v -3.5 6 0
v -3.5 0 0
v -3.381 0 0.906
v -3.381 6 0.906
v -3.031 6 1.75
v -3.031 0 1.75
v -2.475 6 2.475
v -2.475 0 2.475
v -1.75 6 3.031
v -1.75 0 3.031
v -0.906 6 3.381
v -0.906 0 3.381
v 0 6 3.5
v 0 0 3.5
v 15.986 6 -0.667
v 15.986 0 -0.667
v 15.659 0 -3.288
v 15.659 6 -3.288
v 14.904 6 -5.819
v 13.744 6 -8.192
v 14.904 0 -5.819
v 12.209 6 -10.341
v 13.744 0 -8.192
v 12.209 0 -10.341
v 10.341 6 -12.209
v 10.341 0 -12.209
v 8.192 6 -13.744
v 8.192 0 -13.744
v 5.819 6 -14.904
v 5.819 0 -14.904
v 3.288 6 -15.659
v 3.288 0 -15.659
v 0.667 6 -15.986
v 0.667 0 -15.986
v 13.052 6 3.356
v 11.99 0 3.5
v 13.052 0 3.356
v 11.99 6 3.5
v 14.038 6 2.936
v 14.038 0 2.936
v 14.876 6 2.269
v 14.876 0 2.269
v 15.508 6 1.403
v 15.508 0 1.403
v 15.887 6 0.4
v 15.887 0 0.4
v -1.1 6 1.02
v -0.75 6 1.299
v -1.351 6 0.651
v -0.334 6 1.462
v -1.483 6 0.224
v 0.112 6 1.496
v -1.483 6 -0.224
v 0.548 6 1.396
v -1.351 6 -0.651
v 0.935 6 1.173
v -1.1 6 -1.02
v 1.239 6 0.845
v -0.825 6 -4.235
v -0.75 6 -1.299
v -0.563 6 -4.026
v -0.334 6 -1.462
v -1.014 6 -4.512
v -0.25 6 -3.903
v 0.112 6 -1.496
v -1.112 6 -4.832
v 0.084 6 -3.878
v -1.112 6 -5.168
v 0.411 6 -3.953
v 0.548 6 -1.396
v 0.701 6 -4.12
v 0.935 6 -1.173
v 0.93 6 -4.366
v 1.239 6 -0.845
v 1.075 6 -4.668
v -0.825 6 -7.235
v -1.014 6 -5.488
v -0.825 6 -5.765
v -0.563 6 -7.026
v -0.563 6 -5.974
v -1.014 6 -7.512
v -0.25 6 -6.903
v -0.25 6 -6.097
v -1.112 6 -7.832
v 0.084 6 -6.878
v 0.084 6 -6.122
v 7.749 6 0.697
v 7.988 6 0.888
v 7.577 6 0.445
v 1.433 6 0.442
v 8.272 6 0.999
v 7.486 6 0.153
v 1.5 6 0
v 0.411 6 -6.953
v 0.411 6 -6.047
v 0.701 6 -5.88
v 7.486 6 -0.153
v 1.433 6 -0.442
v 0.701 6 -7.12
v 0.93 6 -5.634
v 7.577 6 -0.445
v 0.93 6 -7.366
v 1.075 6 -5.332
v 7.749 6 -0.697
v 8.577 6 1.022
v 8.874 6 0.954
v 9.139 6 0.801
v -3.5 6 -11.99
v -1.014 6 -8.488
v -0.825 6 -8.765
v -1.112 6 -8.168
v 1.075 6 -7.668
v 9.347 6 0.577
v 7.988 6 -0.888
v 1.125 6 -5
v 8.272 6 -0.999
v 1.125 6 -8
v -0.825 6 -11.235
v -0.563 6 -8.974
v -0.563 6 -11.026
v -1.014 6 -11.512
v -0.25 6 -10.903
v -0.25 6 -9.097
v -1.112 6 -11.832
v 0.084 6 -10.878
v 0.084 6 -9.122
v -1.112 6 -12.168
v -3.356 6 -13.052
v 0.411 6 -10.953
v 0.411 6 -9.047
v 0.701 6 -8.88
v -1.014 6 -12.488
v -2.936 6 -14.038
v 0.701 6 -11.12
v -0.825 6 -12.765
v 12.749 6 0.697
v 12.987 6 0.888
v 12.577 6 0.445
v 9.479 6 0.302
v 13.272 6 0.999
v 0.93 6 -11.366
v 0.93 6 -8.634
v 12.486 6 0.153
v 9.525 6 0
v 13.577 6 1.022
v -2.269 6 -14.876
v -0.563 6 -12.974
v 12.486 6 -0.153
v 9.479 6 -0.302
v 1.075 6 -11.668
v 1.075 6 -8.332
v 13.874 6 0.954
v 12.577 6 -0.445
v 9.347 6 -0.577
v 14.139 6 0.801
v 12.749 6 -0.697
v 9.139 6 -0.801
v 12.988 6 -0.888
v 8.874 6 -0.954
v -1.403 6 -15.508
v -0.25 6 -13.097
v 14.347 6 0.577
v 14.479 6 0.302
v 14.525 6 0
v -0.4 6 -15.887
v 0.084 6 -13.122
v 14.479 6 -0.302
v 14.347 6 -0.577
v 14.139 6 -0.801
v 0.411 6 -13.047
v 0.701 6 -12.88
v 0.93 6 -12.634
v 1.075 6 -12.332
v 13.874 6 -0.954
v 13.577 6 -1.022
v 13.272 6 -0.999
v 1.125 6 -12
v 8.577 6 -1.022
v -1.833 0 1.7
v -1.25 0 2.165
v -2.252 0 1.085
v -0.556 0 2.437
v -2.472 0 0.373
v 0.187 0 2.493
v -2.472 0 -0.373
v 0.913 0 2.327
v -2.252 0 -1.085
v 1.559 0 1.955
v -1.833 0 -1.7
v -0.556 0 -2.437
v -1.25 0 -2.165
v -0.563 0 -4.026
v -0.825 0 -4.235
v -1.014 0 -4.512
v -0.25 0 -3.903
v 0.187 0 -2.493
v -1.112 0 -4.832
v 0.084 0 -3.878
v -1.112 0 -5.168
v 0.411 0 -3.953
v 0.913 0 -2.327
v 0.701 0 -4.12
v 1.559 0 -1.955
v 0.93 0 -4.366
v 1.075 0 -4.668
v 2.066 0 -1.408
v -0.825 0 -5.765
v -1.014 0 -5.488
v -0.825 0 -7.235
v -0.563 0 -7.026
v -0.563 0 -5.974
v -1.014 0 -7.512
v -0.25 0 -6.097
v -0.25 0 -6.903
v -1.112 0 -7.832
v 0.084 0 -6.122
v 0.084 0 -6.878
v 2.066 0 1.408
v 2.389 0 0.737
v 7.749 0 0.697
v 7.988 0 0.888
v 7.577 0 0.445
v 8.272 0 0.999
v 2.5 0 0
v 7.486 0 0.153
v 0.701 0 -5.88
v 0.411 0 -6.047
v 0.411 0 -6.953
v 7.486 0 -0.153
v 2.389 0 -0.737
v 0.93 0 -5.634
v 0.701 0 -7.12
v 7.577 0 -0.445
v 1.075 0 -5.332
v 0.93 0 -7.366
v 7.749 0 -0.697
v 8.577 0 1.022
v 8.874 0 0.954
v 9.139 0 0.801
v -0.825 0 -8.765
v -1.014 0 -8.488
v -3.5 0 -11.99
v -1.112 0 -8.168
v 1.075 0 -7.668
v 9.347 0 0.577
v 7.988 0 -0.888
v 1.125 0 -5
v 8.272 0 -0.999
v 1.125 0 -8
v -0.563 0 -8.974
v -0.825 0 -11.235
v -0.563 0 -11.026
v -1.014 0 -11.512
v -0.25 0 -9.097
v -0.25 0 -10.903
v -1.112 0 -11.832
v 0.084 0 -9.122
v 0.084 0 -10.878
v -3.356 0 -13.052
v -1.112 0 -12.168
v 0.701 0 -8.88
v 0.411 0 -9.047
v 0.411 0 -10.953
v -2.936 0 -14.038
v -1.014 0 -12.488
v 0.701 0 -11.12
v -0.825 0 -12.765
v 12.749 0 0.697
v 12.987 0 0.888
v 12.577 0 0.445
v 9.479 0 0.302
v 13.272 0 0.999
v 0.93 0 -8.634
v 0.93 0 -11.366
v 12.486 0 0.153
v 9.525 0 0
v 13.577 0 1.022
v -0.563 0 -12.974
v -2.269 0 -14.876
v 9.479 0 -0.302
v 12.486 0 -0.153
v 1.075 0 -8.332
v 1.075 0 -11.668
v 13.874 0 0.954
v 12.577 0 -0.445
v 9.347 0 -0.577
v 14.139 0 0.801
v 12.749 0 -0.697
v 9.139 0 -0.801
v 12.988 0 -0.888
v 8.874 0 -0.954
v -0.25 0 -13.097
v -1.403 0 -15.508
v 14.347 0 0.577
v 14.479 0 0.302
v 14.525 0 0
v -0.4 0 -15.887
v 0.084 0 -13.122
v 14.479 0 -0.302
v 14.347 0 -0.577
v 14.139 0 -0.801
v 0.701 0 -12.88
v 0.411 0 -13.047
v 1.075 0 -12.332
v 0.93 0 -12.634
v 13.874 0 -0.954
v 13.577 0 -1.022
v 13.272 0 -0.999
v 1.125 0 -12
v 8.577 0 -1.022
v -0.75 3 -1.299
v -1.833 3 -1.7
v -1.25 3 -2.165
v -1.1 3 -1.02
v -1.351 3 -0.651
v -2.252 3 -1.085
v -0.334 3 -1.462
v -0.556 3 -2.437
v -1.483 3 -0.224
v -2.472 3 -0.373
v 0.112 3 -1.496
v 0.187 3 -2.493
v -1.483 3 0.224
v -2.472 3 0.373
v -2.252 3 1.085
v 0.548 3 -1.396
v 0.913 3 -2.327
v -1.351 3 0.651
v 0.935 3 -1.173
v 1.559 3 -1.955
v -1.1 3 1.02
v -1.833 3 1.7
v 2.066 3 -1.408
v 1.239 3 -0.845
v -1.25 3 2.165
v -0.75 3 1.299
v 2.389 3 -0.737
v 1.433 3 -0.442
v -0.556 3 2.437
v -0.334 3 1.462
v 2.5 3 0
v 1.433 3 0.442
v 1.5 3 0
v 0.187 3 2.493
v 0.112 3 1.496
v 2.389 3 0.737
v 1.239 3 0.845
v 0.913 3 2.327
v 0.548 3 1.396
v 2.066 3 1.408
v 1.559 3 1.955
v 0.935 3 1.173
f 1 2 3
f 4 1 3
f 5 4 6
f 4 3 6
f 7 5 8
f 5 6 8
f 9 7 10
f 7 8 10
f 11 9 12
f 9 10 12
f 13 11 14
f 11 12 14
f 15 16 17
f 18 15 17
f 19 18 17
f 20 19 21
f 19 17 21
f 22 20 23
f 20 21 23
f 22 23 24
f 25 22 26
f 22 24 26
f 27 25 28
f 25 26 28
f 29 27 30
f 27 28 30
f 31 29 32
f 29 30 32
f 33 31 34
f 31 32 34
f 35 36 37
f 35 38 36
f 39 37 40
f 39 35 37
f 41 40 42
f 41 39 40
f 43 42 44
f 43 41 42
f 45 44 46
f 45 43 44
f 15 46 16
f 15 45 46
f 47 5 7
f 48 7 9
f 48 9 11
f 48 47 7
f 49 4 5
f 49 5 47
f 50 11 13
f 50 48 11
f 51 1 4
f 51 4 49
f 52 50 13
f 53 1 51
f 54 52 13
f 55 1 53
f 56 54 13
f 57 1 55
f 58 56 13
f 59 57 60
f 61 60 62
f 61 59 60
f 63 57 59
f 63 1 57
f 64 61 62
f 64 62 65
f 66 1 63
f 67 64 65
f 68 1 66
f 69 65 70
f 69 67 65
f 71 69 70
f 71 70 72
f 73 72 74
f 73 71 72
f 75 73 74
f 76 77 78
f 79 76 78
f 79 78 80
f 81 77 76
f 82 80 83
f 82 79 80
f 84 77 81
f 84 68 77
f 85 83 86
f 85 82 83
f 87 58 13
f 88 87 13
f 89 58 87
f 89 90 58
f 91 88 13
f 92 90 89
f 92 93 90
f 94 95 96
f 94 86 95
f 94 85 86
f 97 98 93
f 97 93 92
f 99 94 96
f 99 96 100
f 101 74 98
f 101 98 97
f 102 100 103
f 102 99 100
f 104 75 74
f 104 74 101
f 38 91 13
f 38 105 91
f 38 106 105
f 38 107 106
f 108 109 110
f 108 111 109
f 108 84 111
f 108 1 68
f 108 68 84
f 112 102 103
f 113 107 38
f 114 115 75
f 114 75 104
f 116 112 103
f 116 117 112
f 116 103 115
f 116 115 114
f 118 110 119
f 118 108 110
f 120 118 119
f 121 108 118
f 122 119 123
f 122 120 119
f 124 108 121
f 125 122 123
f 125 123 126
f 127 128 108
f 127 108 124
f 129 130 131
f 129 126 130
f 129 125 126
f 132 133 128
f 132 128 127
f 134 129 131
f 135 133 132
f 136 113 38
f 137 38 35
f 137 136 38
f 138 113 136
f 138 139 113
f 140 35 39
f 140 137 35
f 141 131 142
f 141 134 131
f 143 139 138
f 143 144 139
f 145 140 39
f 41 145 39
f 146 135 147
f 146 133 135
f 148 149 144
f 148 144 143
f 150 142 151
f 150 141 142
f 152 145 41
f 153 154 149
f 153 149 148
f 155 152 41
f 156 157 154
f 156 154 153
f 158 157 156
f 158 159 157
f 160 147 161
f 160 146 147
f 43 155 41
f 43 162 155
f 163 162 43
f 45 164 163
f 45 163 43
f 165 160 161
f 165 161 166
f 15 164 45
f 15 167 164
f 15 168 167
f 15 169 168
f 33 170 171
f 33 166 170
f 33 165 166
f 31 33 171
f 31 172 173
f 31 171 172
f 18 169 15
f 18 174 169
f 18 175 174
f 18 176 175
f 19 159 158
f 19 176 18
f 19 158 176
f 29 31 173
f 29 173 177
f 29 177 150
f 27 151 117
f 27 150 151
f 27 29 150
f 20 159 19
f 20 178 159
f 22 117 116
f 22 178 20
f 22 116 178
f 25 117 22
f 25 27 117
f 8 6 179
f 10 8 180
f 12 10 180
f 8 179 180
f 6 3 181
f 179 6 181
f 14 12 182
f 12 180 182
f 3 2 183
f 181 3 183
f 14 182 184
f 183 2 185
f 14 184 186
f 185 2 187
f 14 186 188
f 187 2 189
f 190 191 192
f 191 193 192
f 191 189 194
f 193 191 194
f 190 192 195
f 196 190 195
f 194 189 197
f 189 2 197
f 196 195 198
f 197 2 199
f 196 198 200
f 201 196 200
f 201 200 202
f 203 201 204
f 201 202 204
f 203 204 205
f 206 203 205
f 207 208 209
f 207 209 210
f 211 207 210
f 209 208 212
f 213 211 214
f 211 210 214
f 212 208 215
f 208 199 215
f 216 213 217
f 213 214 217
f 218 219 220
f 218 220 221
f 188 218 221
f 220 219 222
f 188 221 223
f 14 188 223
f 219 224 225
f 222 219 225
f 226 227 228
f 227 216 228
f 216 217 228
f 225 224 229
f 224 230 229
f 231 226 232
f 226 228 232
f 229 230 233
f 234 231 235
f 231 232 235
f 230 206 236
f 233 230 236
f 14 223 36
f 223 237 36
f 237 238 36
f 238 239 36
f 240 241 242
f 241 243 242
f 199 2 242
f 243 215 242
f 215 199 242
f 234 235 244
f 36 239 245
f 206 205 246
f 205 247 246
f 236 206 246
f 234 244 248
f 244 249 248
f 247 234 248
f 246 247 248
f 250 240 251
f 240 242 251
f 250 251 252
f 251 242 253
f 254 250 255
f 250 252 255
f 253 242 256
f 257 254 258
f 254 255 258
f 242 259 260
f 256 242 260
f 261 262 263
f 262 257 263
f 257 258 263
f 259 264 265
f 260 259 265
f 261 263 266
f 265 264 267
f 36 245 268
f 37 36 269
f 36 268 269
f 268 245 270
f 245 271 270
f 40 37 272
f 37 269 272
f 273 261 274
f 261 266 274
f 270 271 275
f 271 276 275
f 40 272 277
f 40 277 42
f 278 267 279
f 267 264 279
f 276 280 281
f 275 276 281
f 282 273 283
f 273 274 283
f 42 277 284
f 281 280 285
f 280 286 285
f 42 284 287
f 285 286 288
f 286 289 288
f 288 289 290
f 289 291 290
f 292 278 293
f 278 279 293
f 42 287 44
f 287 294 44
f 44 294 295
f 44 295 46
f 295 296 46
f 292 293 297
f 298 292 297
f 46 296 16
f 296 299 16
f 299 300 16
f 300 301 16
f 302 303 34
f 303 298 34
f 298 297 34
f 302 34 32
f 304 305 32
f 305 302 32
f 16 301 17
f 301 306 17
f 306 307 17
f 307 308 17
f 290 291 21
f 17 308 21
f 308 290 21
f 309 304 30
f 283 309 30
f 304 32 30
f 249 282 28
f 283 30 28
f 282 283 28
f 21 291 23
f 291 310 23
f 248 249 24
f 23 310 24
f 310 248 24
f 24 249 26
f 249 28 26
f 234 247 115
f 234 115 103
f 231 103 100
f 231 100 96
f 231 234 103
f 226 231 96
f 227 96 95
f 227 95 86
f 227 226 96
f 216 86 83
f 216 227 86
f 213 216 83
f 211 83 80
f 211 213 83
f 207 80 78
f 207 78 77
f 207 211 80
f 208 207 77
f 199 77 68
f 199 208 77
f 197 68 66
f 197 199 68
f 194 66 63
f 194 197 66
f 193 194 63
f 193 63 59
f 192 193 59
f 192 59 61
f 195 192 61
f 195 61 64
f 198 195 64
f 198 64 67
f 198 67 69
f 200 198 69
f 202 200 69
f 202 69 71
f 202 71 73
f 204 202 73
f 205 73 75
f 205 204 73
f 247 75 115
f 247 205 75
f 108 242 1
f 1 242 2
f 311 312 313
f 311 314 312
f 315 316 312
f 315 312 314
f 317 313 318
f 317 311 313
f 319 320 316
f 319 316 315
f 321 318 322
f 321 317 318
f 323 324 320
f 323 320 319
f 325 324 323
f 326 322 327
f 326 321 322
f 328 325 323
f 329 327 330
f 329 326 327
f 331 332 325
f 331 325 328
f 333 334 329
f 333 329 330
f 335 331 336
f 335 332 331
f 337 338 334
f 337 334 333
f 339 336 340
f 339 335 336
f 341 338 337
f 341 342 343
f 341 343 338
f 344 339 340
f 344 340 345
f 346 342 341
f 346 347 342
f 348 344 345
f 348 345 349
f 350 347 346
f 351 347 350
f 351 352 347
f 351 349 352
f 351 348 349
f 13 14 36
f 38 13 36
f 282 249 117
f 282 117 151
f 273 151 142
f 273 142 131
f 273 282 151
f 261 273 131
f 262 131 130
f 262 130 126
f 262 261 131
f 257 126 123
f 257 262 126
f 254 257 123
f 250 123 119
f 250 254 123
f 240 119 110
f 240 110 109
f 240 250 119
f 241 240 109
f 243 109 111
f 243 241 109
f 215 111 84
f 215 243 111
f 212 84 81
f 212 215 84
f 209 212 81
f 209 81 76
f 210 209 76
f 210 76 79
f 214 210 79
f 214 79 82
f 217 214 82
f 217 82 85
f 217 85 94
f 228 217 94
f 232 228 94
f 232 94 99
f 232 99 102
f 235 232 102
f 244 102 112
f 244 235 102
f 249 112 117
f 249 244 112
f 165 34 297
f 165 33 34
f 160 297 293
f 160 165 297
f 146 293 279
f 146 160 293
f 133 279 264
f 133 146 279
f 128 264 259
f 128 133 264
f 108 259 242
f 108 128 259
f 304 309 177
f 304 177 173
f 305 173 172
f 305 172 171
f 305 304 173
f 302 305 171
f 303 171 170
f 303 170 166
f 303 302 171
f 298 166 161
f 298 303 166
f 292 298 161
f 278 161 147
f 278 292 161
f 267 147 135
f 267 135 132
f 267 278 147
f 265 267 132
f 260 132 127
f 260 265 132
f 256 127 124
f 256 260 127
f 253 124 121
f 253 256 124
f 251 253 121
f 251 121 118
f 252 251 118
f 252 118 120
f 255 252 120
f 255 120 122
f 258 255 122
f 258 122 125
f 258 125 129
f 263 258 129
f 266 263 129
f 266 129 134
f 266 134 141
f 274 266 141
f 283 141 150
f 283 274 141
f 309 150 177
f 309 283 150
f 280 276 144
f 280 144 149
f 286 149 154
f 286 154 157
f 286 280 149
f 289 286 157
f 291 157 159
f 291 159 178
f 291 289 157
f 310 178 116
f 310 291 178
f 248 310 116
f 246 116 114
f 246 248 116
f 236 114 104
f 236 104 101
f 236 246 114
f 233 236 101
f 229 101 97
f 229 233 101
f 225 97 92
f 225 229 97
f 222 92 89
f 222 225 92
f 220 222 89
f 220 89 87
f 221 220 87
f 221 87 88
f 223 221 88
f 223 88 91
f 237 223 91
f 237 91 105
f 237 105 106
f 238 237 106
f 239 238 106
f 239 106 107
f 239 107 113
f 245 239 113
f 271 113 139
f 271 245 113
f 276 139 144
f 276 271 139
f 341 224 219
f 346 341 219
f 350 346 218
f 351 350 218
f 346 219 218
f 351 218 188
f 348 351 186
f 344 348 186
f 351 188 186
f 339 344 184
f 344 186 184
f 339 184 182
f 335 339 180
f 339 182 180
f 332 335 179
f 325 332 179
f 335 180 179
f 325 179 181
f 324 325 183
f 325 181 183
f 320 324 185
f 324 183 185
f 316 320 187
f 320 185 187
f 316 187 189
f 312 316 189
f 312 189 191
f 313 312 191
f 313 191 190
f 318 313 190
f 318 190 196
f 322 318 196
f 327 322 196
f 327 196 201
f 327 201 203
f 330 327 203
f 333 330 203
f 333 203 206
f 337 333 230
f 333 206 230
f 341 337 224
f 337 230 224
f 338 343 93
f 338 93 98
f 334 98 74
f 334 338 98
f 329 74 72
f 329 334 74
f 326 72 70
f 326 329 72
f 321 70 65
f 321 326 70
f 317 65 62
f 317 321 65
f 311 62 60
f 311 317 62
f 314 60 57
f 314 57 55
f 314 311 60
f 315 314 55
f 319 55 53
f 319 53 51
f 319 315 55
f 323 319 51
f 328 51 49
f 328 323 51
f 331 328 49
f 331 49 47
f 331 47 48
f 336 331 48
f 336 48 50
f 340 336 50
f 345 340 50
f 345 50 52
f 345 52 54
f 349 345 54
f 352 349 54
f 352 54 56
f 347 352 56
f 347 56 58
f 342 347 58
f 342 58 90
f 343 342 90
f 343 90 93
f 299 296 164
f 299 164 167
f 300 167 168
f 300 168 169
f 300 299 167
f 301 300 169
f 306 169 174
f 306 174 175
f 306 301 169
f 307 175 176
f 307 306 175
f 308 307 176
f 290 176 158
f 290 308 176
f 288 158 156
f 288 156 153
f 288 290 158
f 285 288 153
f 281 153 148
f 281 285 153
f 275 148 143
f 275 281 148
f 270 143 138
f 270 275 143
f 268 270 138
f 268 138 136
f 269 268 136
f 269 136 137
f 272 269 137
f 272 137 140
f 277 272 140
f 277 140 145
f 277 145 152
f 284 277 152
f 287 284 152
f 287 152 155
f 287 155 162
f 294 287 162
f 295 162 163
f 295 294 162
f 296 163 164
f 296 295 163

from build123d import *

# Parameters (mm, degrees)
SKETCH_1_R          = 1.025
SKETCH_1_R_2        = 1.5
SKETCH_1_R_3        = 1.125
EXTRUDE_1_DEPTH     = 6
SKETCH_3_R          = 2.5
CUT_EXTRUDE_1_DEPTH = 3
FILLET_1_R          = 4


with BuildPart() as part:
    # 草图1 → 凸台-拉伸1 (new body)
    with BuildSketch(Plane(origin=(0, 0, 0), x_dir=(1, 0, 0), z_dir=(0, 1, 0))):
        with BuildLine():
            Line((0, -3.5), (15.612494996, -3.5))
            ThreePointArc((15.612494996, -3.5), (11.313708499, 11.313708499), (-3.5, 15.612494996))
            Line((-3.5, 15.612494996), (-3.5, 0))
            ThreePointArc((-3.5, 0), (-2.474873734, -2.474873734), (0, -3.5))
        make_face()
        with Locations((8.5, 0)):
            Circle(SKETCH_1_R, mode=Mode.SUBTRACT)
        with Locations((13.5, 0)):
            Circle(SKETCH_1_R, mode=Mode.SUBTRACT)
        Circle(SKETCH_1_R_2, mode=Mode.SUBTRACT)
        with Locations((0, 12)):
            Circle(SKETCH_1_R_3, mode=Mode.SUBTRACT)
        with Locations((0, 8)):
            Circle(SKETCH_1_R_3, mode=Mode.SUBTRACT)
        with Locations((0, 5)):
            Circle(SKETCH_1_R_3, mode=Mode.SUBTRACT)
    extrude(amount=EXTRUDE_1_DEPTH)

    # 草图3 → 切除-拉伸1 (cut)
    with BuildSketch(Plane.XZ):
        Circle(SKETCH_3_R)
    extrude(amount=-CUT_EXTRUDE_1_DEPTH, mode=Mode.SUBTRACT)

    # 圆角1
    fillet_1_edges = [part.edges().sort_by_distance(p)[0] for p in [
        (15.612494996, 3, 3.5),
        (-3.5, 3, -15.612494996),
    ]]
    fillet(fillet_1_edges, radius=FILLET_1_R)


solid = part.part
